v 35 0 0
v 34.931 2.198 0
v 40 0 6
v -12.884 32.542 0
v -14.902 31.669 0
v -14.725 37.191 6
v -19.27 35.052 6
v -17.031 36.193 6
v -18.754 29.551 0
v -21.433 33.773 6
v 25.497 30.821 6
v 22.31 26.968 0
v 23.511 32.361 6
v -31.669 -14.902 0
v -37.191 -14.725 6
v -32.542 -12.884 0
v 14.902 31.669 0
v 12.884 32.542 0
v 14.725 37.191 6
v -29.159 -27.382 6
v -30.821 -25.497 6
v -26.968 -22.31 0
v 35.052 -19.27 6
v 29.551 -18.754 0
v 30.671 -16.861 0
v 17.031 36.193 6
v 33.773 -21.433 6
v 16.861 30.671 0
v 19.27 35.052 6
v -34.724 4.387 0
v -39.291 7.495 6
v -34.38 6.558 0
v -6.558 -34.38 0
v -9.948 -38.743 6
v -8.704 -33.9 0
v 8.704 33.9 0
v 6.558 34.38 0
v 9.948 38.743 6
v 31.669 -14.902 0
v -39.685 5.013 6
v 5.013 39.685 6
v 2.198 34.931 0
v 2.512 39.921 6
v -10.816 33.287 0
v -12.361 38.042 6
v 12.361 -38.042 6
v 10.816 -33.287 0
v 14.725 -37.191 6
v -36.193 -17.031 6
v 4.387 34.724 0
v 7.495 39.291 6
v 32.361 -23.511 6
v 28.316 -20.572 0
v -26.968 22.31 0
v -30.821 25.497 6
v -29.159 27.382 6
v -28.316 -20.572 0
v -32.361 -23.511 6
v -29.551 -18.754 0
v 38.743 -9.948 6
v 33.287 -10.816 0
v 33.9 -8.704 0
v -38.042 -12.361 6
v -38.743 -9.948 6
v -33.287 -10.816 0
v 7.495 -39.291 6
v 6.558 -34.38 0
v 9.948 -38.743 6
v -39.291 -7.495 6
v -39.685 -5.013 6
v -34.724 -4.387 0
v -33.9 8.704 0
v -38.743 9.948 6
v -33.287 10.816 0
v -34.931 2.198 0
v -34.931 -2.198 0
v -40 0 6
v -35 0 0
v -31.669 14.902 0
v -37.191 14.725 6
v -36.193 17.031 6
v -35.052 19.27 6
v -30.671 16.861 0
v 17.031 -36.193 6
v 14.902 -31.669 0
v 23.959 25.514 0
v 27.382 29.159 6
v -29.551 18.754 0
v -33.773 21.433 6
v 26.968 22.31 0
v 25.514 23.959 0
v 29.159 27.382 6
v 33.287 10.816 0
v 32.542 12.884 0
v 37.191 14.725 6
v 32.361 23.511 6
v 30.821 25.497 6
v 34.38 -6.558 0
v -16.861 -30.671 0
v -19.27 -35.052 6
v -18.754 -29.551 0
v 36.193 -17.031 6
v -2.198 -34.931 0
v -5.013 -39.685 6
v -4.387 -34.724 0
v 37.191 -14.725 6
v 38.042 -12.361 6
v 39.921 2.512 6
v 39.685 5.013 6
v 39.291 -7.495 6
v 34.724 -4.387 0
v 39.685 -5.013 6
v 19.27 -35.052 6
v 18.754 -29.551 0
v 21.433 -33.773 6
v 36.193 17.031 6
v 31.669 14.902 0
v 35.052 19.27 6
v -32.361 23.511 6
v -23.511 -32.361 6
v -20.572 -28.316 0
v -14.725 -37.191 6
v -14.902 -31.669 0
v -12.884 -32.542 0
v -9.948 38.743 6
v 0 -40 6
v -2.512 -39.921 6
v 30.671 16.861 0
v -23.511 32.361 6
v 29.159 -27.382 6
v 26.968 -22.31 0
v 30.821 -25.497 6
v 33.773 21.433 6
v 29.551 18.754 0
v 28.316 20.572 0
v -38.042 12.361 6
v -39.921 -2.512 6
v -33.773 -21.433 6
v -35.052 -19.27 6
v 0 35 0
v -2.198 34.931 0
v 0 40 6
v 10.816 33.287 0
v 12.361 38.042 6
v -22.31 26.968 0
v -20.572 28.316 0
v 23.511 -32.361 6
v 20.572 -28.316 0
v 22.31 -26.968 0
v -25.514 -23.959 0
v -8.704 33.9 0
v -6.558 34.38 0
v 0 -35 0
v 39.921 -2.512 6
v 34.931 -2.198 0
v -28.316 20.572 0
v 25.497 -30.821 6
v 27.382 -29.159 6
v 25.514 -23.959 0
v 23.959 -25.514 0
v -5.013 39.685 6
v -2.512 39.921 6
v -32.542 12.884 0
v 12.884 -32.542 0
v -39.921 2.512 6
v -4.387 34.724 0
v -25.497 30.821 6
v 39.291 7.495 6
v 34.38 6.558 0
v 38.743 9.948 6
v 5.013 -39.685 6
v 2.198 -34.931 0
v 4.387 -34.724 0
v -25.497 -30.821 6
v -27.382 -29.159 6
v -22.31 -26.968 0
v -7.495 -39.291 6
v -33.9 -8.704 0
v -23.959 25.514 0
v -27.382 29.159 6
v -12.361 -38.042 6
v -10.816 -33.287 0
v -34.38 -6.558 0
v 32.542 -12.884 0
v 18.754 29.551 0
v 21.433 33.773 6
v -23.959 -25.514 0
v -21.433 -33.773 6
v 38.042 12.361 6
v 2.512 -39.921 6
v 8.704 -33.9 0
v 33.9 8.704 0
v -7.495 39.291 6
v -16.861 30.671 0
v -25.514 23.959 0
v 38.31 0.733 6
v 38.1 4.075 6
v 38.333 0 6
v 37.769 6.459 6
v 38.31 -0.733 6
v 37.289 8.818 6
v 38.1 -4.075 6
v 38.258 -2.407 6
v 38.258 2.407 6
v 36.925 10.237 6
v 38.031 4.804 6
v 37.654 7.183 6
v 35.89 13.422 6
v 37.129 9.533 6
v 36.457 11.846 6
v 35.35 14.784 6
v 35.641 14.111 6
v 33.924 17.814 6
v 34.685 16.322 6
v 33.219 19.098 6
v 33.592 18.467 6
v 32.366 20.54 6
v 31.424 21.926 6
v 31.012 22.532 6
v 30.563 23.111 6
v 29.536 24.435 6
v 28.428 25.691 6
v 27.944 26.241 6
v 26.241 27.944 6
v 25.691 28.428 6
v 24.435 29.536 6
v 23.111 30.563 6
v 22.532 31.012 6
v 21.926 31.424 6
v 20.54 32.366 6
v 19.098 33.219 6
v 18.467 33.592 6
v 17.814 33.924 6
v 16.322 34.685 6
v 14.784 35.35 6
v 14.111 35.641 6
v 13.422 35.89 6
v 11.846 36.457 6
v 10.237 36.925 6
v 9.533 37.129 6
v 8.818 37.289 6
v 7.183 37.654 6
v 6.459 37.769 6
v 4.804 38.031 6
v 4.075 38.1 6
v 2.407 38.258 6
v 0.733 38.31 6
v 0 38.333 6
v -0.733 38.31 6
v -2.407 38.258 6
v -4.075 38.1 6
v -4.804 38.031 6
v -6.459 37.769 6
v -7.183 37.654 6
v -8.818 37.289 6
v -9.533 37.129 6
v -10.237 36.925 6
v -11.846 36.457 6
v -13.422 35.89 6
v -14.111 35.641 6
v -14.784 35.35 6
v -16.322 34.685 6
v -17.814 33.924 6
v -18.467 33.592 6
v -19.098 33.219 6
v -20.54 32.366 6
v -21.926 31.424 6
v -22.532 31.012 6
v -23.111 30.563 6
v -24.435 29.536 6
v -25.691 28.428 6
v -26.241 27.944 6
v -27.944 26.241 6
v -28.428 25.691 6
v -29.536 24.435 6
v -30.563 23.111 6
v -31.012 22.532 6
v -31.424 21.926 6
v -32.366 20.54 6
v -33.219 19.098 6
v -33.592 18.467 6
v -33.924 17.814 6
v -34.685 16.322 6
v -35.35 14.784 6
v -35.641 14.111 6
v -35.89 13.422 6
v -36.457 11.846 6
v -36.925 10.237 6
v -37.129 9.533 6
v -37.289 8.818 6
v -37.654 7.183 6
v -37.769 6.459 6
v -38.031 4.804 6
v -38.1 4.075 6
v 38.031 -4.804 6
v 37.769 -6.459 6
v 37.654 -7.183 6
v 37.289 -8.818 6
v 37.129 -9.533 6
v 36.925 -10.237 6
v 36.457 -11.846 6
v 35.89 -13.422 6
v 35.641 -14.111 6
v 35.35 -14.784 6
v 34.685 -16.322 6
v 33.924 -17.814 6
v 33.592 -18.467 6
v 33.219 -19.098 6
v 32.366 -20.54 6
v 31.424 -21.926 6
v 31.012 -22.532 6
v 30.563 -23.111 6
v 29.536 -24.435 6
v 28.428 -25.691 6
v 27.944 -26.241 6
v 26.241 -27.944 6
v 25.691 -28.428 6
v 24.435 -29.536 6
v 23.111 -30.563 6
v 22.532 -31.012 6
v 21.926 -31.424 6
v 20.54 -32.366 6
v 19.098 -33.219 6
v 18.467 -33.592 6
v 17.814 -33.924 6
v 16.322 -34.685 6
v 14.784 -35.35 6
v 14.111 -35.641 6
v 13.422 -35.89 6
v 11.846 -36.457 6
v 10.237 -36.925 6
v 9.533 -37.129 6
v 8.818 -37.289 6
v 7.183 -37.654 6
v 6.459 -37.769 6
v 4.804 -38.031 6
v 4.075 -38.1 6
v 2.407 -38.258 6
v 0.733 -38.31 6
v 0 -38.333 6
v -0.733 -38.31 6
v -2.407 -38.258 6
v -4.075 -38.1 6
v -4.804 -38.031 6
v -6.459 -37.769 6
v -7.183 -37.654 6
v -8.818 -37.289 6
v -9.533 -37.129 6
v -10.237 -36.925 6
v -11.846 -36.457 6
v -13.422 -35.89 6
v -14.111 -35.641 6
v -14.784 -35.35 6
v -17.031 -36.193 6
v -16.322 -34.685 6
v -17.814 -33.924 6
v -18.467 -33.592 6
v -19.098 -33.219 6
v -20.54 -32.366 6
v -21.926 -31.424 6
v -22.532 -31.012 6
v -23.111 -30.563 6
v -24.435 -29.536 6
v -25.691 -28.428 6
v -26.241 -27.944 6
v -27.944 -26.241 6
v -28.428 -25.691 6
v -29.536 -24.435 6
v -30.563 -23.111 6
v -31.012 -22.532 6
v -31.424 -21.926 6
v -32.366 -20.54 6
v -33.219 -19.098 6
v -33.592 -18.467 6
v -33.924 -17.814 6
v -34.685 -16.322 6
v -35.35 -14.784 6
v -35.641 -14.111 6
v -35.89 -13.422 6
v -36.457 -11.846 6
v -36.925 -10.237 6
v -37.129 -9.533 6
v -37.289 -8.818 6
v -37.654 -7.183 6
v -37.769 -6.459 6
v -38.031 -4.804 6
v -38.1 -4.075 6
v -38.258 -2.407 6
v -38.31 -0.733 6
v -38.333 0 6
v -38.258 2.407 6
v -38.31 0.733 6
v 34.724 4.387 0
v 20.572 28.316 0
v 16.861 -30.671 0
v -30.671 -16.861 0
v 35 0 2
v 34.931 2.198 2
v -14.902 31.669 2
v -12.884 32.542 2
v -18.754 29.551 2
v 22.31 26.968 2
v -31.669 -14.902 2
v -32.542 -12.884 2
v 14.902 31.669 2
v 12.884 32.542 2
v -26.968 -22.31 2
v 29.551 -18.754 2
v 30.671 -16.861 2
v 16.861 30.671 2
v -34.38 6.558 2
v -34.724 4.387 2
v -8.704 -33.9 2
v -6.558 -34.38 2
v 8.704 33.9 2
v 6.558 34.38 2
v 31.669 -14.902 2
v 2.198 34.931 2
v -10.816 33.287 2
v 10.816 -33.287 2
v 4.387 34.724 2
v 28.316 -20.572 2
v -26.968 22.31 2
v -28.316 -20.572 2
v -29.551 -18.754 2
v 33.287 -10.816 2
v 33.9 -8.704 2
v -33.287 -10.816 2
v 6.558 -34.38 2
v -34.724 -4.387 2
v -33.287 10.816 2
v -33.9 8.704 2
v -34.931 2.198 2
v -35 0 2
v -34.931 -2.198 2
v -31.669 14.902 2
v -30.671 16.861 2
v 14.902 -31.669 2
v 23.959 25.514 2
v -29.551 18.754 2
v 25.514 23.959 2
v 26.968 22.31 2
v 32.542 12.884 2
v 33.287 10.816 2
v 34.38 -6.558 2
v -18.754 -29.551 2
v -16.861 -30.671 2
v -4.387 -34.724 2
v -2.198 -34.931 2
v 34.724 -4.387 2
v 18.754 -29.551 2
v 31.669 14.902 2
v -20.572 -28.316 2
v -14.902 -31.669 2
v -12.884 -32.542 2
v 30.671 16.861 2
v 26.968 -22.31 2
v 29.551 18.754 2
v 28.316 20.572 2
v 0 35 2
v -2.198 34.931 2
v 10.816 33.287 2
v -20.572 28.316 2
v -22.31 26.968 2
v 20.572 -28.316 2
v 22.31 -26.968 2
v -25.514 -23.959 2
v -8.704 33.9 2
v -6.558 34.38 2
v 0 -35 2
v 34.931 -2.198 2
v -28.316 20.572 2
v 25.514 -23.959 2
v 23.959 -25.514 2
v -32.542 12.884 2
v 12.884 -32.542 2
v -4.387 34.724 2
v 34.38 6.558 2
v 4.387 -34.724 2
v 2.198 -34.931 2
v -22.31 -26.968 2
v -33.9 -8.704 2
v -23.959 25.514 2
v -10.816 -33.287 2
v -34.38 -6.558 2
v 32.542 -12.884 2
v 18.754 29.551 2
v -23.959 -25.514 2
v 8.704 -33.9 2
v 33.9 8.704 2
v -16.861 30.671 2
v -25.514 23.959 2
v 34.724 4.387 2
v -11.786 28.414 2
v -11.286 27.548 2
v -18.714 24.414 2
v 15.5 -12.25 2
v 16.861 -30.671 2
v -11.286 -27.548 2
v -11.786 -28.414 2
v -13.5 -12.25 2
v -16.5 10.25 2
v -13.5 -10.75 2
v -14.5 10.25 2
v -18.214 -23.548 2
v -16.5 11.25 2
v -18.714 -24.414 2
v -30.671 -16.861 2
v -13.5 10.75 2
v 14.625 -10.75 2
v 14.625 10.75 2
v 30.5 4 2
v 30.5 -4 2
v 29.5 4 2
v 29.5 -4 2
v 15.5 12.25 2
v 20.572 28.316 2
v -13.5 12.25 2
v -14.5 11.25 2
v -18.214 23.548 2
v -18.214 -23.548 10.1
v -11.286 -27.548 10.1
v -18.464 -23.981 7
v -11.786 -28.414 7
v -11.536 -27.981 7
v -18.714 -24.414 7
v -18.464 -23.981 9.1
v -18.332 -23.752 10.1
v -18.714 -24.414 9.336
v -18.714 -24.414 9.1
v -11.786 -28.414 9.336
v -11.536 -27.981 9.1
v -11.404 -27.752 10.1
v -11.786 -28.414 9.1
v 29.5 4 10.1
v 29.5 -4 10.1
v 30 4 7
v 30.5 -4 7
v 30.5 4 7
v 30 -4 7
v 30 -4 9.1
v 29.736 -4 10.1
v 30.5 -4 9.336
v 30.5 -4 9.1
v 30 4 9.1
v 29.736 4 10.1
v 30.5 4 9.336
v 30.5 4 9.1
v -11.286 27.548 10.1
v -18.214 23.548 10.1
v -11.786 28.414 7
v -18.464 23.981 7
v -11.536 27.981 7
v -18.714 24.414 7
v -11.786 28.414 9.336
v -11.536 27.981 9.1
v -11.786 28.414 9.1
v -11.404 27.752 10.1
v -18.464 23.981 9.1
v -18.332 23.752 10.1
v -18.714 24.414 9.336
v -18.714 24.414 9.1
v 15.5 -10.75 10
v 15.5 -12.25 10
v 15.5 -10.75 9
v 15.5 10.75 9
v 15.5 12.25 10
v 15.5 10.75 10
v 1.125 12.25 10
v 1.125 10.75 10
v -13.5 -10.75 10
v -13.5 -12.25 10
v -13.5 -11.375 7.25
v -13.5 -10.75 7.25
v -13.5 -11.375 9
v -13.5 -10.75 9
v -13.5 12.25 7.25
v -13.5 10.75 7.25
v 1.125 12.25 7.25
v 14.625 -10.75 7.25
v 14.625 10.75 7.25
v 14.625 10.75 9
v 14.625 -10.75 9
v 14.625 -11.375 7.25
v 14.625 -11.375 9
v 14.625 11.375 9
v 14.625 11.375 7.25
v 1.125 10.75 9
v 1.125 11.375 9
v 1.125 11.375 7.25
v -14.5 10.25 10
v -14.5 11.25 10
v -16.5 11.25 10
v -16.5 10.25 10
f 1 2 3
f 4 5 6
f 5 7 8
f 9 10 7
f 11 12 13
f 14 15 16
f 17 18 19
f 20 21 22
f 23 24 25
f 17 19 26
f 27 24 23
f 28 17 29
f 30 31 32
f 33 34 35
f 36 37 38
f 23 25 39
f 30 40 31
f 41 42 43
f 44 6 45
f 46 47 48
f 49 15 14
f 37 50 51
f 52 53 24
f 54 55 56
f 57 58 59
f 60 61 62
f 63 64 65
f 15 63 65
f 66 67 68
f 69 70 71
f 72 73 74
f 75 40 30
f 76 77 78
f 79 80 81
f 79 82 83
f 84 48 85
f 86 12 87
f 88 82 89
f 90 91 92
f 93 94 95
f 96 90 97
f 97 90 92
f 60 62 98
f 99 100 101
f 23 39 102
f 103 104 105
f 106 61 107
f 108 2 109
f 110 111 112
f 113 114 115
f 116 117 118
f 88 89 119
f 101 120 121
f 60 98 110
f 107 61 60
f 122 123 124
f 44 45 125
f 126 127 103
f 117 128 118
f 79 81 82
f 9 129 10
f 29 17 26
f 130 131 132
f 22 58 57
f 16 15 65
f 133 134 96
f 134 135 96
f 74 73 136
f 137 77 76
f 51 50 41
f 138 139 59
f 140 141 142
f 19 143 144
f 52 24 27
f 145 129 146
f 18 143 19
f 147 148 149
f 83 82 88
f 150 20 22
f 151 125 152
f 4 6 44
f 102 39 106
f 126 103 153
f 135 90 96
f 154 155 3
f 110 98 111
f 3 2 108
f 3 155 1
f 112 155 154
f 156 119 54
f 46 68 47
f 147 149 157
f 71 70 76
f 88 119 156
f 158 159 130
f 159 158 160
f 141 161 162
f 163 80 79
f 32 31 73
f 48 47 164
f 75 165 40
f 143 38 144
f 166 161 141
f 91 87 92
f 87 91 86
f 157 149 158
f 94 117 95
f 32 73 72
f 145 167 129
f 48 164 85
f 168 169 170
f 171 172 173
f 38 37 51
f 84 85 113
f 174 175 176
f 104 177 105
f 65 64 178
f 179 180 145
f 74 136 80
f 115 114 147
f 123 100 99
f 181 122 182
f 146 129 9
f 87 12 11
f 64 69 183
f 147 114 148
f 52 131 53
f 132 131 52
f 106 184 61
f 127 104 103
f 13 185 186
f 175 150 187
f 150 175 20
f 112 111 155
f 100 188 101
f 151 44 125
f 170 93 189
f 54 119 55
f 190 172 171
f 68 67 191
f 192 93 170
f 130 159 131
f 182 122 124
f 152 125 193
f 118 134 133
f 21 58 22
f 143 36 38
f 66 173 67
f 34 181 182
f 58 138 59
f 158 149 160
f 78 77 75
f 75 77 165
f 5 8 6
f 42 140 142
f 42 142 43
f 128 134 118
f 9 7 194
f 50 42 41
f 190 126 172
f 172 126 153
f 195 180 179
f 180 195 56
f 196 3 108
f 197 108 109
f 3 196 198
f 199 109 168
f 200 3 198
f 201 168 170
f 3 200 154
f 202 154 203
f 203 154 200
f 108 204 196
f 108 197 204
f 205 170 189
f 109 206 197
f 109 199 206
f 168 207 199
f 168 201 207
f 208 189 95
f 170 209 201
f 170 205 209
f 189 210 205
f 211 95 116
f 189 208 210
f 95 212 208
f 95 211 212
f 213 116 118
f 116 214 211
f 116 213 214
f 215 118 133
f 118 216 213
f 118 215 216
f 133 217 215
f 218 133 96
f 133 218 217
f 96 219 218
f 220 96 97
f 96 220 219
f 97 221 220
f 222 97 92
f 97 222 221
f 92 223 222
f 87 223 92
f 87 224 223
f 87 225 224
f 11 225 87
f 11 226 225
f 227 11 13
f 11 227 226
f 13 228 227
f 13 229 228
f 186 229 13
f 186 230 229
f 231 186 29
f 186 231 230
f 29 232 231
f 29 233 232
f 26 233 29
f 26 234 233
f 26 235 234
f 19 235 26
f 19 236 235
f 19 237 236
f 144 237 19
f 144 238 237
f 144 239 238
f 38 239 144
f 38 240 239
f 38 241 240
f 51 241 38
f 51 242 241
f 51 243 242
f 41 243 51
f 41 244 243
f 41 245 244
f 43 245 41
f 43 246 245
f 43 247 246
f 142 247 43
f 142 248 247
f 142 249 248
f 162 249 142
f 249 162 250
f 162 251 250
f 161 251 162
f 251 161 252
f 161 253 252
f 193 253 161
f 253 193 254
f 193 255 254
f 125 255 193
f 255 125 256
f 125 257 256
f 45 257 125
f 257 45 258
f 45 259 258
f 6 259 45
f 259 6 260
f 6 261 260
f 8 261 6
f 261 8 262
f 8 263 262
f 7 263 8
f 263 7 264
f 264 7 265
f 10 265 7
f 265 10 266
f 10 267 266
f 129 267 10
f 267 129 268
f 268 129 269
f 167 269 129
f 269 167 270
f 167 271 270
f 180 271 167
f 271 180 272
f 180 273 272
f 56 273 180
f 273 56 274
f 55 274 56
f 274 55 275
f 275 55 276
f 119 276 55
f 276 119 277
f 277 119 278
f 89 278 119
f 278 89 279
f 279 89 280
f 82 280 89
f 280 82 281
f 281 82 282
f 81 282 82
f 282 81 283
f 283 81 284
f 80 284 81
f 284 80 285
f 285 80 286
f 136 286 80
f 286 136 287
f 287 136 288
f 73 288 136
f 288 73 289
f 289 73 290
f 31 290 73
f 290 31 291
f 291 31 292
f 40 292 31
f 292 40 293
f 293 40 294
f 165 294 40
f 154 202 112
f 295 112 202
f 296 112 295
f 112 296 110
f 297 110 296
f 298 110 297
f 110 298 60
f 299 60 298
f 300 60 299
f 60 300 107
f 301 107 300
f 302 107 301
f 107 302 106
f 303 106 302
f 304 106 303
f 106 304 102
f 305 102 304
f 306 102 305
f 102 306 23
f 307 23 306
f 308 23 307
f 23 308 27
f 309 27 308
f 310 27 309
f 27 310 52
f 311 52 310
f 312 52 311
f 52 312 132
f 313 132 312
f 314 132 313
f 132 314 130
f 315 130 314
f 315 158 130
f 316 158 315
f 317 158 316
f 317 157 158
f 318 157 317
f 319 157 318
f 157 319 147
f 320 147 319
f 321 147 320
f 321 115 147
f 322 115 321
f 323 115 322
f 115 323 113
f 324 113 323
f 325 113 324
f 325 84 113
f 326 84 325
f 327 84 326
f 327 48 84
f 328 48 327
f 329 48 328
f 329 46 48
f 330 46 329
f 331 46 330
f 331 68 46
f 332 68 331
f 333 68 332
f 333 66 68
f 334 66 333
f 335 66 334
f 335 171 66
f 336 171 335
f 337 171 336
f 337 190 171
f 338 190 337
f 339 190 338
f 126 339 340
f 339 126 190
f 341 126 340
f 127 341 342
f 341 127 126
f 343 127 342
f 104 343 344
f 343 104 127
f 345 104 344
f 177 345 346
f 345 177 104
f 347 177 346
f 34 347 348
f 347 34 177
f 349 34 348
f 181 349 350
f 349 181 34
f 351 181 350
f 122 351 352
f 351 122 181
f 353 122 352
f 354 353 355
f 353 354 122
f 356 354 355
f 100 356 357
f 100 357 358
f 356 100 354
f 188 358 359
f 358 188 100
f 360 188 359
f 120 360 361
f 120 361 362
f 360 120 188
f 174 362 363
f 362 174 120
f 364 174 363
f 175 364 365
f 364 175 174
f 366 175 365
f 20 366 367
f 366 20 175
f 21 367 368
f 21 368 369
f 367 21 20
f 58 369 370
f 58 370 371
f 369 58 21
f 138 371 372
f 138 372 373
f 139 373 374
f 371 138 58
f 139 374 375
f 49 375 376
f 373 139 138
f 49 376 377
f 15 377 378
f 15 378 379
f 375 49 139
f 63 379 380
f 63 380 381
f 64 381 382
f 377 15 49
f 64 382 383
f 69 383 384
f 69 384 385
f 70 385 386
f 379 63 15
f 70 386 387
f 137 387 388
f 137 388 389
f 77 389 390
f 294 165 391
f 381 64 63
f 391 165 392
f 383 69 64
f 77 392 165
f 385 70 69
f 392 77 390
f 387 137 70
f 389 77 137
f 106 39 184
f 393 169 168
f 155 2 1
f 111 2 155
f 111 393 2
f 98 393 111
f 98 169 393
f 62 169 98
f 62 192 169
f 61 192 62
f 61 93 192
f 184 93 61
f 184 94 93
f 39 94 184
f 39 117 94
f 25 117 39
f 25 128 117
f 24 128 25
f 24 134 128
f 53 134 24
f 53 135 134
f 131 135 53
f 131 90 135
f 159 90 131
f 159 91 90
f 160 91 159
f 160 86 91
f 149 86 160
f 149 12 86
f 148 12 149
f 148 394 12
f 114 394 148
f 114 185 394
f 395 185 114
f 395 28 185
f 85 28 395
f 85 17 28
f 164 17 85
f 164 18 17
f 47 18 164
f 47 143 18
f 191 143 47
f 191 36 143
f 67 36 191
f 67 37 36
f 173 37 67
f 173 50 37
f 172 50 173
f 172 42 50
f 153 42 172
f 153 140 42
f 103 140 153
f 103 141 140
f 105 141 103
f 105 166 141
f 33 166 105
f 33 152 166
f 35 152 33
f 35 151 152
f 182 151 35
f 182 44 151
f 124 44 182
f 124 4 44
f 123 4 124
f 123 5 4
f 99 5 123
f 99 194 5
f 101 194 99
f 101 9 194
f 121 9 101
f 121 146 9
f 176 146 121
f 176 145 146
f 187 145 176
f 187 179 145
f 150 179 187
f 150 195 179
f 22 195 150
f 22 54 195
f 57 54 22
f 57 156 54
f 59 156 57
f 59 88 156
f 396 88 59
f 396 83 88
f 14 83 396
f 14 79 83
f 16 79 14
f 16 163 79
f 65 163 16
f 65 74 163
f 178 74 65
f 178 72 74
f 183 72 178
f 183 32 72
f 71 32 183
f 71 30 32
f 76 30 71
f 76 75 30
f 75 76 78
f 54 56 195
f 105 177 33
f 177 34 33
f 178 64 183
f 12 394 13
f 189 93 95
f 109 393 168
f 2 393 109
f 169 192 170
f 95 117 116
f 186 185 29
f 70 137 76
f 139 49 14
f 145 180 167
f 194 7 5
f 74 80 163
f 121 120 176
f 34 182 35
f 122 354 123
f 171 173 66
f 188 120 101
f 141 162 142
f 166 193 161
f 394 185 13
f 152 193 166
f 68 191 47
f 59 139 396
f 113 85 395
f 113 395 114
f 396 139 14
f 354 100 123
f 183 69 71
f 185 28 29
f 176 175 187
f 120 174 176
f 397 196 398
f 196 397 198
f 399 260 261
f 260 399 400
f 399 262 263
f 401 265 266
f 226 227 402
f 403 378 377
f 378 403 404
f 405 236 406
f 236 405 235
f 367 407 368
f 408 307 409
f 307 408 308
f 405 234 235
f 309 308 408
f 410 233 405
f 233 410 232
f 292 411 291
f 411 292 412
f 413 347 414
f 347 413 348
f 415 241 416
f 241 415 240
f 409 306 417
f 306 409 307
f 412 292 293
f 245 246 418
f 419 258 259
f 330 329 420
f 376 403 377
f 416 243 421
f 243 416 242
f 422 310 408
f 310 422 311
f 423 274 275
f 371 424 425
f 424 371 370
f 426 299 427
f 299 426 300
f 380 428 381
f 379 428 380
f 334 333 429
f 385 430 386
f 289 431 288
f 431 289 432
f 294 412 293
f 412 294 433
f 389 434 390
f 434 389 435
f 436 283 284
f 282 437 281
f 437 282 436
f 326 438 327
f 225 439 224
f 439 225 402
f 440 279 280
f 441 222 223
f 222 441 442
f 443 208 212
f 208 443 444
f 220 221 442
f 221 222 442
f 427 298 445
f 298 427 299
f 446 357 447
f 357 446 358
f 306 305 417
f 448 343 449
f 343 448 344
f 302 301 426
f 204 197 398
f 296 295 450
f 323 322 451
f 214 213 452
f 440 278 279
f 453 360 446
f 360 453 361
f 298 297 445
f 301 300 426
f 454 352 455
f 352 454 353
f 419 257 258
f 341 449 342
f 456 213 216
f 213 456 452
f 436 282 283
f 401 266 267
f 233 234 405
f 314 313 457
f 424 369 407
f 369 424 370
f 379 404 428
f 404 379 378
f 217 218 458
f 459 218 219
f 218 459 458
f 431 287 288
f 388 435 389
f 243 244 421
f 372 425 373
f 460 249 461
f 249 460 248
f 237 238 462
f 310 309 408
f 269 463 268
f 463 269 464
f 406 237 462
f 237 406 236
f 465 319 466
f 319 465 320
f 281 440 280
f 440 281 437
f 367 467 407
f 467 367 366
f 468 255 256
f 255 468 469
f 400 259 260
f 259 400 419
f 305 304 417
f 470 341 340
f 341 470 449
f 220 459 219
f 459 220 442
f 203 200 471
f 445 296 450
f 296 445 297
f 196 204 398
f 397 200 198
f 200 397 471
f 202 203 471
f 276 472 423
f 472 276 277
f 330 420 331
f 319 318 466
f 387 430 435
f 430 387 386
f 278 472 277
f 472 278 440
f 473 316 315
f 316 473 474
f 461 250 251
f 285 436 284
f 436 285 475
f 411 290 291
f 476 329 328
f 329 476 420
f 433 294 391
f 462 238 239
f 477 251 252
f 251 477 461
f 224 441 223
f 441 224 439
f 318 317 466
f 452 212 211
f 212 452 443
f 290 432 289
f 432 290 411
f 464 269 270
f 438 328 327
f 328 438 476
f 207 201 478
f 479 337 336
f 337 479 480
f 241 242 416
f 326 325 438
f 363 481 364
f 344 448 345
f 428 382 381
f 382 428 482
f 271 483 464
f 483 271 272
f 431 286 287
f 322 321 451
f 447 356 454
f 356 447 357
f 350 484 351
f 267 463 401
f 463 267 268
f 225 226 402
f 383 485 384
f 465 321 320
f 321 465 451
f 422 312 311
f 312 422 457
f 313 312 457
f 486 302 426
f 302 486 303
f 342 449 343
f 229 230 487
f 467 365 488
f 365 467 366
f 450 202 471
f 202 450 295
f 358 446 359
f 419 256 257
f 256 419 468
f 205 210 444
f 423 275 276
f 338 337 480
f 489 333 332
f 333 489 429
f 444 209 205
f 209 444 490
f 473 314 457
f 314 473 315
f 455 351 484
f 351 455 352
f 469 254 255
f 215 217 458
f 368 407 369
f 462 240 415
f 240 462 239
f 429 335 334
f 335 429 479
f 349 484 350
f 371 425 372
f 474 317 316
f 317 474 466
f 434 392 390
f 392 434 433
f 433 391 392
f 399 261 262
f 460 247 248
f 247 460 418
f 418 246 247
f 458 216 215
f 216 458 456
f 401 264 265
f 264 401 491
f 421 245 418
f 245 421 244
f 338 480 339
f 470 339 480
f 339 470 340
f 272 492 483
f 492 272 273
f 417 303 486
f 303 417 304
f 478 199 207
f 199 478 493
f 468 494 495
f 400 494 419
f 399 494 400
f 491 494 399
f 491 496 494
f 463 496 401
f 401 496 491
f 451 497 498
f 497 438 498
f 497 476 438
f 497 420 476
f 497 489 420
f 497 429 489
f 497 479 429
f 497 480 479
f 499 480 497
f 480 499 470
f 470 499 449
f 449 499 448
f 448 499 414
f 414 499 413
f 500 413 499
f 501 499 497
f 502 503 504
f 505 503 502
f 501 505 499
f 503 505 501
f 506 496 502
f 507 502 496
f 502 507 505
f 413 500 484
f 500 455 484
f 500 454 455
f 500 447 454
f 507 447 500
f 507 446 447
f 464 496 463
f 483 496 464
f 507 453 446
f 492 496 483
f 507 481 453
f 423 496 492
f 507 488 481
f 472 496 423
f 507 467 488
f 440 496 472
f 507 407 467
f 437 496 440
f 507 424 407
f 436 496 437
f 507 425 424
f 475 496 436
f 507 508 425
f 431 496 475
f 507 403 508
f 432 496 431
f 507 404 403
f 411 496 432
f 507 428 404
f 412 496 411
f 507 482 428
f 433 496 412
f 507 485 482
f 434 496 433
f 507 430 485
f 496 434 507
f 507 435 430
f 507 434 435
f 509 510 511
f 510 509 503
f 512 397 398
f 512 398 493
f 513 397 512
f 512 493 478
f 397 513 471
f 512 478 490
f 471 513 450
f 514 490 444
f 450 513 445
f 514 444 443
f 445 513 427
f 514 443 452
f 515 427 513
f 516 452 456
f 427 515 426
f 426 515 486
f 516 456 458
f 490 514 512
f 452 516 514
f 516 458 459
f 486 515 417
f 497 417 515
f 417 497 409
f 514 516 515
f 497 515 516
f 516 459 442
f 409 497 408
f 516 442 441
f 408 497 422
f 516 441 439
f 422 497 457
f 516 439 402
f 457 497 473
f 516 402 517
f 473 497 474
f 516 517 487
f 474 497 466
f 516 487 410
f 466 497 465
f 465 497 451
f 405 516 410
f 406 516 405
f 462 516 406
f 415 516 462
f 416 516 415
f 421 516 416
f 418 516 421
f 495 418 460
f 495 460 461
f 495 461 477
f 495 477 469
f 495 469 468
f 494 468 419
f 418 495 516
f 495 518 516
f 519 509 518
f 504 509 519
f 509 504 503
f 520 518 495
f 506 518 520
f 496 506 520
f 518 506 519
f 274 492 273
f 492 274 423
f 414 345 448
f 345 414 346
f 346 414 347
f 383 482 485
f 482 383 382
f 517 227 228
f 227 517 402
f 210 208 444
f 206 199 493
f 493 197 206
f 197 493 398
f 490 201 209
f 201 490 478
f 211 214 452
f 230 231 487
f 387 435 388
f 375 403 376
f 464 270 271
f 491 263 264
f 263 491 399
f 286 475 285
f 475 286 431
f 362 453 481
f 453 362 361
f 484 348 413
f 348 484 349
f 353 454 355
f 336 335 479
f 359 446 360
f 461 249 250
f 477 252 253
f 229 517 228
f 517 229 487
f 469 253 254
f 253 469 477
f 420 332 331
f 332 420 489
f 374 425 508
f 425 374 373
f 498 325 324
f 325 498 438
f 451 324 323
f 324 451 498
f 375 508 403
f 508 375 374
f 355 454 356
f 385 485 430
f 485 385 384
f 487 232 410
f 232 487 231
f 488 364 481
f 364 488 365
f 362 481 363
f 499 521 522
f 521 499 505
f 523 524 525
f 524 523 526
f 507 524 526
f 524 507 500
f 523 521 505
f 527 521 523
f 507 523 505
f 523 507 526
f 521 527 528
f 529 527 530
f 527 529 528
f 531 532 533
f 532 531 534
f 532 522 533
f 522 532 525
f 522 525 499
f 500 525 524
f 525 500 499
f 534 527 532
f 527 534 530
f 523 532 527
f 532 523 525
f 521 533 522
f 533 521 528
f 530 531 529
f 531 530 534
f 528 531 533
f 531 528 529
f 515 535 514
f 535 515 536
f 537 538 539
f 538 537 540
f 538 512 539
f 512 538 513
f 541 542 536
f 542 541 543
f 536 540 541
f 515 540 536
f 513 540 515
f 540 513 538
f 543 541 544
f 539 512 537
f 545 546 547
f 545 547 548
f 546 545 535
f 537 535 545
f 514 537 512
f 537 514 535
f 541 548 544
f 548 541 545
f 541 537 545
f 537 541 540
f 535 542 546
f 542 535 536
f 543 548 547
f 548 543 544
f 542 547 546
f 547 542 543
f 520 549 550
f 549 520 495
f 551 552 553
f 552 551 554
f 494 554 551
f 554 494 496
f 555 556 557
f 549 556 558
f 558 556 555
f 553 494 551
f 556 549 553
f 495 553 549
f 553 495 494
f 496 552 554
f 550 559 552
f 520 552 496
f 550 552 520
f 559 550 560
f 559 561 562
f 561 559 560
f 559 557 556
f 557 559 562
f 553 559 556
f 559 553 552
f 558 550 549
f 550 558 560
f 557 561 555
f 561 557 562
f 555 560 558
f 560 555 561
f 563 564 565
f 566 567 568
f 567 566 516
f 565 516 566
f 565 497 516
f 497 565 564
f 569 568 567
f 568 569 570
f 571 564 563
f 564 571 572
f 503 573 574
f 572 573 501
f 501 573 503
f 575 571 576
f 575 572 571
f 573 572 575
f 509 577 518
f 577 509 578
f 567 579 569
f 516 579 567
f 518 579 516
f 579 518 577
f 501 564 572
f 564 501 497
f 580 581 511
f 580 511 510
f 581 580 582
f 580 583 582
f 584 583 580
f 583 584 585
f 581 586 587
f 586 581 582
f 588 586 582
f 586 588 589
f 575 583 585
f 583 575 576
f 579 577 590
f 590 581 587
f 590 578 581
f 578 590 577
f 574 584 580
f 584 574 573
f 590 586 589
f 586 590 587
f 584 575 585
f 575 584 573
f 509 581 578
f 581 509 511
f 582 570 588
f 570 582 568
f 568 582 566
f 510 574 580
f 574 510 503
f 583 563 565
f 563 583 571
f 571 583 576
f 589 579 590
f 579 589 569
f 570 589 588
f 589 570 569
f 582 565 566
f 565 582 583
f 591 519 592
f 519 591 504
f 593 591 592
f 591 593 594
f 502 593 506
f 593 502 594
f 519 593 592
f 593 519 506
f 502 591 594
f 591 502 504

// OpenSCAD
// file: housing.scad
width  = 22.5;
length = 29.0;
height =  1.6;

p_width  = width  + 0.25;
p_length = length + 0.25;
p_height = height + 0.15;

b_width  = width  + 2;
b_length = length;

module disc()
{
    difference()
    {
        cylinder(h=6, r1=35, r2=40, center=false, $fn=100);
        translate([0, 0, 2])
        {
            cylinder(h=6, r1=35, r2=40, center=false, $fn=100);
        }
    }
}

module supports()
{
    for(i=[0:120:360])
    {
        rotate([0, 0, i])
        {
            translate([30, 0, 2])
            {
                difference()
                {
                    cylinder(h=5, r=4, $fn=100);
                    cylinder(h=5, r=1.3, $fn=100);
                }
            }
        }
    }
}

module clippers(w=8)
{
    for(i=[60:120:360]) rotate([0, 0, i]) translate([-30, 0, 0])
    {
        translate([-0.5, -w/2, 2])
            difference()
            {
                union()
                {
                    translate([0, 0, 0]) cube([1, w, 5]);
                    translate([0.5, 0, 5]) cube([0.5, w, 2.1]);
                    translate([0, 0, 7.1]) cube([1, w, 1]);
                }
                translate([-1, 0, 7.75]) rotate([0, 45, 0]) cube([1, w, 2]);
            }
    }
}

module clipping_holes(w=8)
{
    for(i=[0:120:360]) rotate([0, 0, i])
    {
        translate([-30, 0, 0])
        {
            translate([0, -(w + 0.1)/2, 0]) cube([1.1, w + 0.1, 2.1]);
        }
    }
}

module pcb_support()
{
    difference()
    {
        translate([-(b_length)/2+1, -b_width/2, 2]) cube([b_length, b_width, 8]);
        translate([-p_length/2, -p_width/2, 5.5 + p_height])
            cube([p_length, p_width, p_height]);
        translate([-p_length/2, -(width - 1.0)/2, 2]) cube([p_length, width - 1.0, 10]);
        translate([-p_length/2, -p_width/2+1, 5.5 + p_height])
            cube([p_length-13.5, p_width+2, p_height+2]);
        translate([-p_length/2 + 1, -(width-1)/2, 9]) cube([p_length, width - 1.0, 2]);
    }

    translate([-length/2-2, width/2-1,2]) cube([2, 1, 8]);

}

module pcb()
{
    translate([-length/2, -width/2, 5.5 + height]) cube([length, width, height]);
}

module battery_support()
{
    difference()
    {
        translate([-35/2, -22/2, 2]) cube([37,22,9]);
        translate([-37/2, -20/2, 2]) cube([37,20, 8]);
        translate([-37/2, -18/2, 2]) cube([37,18,10]);
    }
}

module cable_hole()
{
    translate([-17.5, 0, 0])
    {
        cylinder(h=6, r1=10, r2=10, center=false, $fn=100);
    }
}

module solar_panel(l=37.5, w=22.5)
{
    union()
    {
        translate([-(l+0.1)/2, -(w+0.1)/2, 1]) cube([l+0.1, w+0.1, 2]);
        translate([-(l-1)/2, -(w-1)/2, 0]) cube([l-1, w-1, 1]);
    }
}
// main file
use <housing.scad>

union()
{
    difference()
    {
        disc();
    }
    //support();
    clippers();
    pcb_support();
}
